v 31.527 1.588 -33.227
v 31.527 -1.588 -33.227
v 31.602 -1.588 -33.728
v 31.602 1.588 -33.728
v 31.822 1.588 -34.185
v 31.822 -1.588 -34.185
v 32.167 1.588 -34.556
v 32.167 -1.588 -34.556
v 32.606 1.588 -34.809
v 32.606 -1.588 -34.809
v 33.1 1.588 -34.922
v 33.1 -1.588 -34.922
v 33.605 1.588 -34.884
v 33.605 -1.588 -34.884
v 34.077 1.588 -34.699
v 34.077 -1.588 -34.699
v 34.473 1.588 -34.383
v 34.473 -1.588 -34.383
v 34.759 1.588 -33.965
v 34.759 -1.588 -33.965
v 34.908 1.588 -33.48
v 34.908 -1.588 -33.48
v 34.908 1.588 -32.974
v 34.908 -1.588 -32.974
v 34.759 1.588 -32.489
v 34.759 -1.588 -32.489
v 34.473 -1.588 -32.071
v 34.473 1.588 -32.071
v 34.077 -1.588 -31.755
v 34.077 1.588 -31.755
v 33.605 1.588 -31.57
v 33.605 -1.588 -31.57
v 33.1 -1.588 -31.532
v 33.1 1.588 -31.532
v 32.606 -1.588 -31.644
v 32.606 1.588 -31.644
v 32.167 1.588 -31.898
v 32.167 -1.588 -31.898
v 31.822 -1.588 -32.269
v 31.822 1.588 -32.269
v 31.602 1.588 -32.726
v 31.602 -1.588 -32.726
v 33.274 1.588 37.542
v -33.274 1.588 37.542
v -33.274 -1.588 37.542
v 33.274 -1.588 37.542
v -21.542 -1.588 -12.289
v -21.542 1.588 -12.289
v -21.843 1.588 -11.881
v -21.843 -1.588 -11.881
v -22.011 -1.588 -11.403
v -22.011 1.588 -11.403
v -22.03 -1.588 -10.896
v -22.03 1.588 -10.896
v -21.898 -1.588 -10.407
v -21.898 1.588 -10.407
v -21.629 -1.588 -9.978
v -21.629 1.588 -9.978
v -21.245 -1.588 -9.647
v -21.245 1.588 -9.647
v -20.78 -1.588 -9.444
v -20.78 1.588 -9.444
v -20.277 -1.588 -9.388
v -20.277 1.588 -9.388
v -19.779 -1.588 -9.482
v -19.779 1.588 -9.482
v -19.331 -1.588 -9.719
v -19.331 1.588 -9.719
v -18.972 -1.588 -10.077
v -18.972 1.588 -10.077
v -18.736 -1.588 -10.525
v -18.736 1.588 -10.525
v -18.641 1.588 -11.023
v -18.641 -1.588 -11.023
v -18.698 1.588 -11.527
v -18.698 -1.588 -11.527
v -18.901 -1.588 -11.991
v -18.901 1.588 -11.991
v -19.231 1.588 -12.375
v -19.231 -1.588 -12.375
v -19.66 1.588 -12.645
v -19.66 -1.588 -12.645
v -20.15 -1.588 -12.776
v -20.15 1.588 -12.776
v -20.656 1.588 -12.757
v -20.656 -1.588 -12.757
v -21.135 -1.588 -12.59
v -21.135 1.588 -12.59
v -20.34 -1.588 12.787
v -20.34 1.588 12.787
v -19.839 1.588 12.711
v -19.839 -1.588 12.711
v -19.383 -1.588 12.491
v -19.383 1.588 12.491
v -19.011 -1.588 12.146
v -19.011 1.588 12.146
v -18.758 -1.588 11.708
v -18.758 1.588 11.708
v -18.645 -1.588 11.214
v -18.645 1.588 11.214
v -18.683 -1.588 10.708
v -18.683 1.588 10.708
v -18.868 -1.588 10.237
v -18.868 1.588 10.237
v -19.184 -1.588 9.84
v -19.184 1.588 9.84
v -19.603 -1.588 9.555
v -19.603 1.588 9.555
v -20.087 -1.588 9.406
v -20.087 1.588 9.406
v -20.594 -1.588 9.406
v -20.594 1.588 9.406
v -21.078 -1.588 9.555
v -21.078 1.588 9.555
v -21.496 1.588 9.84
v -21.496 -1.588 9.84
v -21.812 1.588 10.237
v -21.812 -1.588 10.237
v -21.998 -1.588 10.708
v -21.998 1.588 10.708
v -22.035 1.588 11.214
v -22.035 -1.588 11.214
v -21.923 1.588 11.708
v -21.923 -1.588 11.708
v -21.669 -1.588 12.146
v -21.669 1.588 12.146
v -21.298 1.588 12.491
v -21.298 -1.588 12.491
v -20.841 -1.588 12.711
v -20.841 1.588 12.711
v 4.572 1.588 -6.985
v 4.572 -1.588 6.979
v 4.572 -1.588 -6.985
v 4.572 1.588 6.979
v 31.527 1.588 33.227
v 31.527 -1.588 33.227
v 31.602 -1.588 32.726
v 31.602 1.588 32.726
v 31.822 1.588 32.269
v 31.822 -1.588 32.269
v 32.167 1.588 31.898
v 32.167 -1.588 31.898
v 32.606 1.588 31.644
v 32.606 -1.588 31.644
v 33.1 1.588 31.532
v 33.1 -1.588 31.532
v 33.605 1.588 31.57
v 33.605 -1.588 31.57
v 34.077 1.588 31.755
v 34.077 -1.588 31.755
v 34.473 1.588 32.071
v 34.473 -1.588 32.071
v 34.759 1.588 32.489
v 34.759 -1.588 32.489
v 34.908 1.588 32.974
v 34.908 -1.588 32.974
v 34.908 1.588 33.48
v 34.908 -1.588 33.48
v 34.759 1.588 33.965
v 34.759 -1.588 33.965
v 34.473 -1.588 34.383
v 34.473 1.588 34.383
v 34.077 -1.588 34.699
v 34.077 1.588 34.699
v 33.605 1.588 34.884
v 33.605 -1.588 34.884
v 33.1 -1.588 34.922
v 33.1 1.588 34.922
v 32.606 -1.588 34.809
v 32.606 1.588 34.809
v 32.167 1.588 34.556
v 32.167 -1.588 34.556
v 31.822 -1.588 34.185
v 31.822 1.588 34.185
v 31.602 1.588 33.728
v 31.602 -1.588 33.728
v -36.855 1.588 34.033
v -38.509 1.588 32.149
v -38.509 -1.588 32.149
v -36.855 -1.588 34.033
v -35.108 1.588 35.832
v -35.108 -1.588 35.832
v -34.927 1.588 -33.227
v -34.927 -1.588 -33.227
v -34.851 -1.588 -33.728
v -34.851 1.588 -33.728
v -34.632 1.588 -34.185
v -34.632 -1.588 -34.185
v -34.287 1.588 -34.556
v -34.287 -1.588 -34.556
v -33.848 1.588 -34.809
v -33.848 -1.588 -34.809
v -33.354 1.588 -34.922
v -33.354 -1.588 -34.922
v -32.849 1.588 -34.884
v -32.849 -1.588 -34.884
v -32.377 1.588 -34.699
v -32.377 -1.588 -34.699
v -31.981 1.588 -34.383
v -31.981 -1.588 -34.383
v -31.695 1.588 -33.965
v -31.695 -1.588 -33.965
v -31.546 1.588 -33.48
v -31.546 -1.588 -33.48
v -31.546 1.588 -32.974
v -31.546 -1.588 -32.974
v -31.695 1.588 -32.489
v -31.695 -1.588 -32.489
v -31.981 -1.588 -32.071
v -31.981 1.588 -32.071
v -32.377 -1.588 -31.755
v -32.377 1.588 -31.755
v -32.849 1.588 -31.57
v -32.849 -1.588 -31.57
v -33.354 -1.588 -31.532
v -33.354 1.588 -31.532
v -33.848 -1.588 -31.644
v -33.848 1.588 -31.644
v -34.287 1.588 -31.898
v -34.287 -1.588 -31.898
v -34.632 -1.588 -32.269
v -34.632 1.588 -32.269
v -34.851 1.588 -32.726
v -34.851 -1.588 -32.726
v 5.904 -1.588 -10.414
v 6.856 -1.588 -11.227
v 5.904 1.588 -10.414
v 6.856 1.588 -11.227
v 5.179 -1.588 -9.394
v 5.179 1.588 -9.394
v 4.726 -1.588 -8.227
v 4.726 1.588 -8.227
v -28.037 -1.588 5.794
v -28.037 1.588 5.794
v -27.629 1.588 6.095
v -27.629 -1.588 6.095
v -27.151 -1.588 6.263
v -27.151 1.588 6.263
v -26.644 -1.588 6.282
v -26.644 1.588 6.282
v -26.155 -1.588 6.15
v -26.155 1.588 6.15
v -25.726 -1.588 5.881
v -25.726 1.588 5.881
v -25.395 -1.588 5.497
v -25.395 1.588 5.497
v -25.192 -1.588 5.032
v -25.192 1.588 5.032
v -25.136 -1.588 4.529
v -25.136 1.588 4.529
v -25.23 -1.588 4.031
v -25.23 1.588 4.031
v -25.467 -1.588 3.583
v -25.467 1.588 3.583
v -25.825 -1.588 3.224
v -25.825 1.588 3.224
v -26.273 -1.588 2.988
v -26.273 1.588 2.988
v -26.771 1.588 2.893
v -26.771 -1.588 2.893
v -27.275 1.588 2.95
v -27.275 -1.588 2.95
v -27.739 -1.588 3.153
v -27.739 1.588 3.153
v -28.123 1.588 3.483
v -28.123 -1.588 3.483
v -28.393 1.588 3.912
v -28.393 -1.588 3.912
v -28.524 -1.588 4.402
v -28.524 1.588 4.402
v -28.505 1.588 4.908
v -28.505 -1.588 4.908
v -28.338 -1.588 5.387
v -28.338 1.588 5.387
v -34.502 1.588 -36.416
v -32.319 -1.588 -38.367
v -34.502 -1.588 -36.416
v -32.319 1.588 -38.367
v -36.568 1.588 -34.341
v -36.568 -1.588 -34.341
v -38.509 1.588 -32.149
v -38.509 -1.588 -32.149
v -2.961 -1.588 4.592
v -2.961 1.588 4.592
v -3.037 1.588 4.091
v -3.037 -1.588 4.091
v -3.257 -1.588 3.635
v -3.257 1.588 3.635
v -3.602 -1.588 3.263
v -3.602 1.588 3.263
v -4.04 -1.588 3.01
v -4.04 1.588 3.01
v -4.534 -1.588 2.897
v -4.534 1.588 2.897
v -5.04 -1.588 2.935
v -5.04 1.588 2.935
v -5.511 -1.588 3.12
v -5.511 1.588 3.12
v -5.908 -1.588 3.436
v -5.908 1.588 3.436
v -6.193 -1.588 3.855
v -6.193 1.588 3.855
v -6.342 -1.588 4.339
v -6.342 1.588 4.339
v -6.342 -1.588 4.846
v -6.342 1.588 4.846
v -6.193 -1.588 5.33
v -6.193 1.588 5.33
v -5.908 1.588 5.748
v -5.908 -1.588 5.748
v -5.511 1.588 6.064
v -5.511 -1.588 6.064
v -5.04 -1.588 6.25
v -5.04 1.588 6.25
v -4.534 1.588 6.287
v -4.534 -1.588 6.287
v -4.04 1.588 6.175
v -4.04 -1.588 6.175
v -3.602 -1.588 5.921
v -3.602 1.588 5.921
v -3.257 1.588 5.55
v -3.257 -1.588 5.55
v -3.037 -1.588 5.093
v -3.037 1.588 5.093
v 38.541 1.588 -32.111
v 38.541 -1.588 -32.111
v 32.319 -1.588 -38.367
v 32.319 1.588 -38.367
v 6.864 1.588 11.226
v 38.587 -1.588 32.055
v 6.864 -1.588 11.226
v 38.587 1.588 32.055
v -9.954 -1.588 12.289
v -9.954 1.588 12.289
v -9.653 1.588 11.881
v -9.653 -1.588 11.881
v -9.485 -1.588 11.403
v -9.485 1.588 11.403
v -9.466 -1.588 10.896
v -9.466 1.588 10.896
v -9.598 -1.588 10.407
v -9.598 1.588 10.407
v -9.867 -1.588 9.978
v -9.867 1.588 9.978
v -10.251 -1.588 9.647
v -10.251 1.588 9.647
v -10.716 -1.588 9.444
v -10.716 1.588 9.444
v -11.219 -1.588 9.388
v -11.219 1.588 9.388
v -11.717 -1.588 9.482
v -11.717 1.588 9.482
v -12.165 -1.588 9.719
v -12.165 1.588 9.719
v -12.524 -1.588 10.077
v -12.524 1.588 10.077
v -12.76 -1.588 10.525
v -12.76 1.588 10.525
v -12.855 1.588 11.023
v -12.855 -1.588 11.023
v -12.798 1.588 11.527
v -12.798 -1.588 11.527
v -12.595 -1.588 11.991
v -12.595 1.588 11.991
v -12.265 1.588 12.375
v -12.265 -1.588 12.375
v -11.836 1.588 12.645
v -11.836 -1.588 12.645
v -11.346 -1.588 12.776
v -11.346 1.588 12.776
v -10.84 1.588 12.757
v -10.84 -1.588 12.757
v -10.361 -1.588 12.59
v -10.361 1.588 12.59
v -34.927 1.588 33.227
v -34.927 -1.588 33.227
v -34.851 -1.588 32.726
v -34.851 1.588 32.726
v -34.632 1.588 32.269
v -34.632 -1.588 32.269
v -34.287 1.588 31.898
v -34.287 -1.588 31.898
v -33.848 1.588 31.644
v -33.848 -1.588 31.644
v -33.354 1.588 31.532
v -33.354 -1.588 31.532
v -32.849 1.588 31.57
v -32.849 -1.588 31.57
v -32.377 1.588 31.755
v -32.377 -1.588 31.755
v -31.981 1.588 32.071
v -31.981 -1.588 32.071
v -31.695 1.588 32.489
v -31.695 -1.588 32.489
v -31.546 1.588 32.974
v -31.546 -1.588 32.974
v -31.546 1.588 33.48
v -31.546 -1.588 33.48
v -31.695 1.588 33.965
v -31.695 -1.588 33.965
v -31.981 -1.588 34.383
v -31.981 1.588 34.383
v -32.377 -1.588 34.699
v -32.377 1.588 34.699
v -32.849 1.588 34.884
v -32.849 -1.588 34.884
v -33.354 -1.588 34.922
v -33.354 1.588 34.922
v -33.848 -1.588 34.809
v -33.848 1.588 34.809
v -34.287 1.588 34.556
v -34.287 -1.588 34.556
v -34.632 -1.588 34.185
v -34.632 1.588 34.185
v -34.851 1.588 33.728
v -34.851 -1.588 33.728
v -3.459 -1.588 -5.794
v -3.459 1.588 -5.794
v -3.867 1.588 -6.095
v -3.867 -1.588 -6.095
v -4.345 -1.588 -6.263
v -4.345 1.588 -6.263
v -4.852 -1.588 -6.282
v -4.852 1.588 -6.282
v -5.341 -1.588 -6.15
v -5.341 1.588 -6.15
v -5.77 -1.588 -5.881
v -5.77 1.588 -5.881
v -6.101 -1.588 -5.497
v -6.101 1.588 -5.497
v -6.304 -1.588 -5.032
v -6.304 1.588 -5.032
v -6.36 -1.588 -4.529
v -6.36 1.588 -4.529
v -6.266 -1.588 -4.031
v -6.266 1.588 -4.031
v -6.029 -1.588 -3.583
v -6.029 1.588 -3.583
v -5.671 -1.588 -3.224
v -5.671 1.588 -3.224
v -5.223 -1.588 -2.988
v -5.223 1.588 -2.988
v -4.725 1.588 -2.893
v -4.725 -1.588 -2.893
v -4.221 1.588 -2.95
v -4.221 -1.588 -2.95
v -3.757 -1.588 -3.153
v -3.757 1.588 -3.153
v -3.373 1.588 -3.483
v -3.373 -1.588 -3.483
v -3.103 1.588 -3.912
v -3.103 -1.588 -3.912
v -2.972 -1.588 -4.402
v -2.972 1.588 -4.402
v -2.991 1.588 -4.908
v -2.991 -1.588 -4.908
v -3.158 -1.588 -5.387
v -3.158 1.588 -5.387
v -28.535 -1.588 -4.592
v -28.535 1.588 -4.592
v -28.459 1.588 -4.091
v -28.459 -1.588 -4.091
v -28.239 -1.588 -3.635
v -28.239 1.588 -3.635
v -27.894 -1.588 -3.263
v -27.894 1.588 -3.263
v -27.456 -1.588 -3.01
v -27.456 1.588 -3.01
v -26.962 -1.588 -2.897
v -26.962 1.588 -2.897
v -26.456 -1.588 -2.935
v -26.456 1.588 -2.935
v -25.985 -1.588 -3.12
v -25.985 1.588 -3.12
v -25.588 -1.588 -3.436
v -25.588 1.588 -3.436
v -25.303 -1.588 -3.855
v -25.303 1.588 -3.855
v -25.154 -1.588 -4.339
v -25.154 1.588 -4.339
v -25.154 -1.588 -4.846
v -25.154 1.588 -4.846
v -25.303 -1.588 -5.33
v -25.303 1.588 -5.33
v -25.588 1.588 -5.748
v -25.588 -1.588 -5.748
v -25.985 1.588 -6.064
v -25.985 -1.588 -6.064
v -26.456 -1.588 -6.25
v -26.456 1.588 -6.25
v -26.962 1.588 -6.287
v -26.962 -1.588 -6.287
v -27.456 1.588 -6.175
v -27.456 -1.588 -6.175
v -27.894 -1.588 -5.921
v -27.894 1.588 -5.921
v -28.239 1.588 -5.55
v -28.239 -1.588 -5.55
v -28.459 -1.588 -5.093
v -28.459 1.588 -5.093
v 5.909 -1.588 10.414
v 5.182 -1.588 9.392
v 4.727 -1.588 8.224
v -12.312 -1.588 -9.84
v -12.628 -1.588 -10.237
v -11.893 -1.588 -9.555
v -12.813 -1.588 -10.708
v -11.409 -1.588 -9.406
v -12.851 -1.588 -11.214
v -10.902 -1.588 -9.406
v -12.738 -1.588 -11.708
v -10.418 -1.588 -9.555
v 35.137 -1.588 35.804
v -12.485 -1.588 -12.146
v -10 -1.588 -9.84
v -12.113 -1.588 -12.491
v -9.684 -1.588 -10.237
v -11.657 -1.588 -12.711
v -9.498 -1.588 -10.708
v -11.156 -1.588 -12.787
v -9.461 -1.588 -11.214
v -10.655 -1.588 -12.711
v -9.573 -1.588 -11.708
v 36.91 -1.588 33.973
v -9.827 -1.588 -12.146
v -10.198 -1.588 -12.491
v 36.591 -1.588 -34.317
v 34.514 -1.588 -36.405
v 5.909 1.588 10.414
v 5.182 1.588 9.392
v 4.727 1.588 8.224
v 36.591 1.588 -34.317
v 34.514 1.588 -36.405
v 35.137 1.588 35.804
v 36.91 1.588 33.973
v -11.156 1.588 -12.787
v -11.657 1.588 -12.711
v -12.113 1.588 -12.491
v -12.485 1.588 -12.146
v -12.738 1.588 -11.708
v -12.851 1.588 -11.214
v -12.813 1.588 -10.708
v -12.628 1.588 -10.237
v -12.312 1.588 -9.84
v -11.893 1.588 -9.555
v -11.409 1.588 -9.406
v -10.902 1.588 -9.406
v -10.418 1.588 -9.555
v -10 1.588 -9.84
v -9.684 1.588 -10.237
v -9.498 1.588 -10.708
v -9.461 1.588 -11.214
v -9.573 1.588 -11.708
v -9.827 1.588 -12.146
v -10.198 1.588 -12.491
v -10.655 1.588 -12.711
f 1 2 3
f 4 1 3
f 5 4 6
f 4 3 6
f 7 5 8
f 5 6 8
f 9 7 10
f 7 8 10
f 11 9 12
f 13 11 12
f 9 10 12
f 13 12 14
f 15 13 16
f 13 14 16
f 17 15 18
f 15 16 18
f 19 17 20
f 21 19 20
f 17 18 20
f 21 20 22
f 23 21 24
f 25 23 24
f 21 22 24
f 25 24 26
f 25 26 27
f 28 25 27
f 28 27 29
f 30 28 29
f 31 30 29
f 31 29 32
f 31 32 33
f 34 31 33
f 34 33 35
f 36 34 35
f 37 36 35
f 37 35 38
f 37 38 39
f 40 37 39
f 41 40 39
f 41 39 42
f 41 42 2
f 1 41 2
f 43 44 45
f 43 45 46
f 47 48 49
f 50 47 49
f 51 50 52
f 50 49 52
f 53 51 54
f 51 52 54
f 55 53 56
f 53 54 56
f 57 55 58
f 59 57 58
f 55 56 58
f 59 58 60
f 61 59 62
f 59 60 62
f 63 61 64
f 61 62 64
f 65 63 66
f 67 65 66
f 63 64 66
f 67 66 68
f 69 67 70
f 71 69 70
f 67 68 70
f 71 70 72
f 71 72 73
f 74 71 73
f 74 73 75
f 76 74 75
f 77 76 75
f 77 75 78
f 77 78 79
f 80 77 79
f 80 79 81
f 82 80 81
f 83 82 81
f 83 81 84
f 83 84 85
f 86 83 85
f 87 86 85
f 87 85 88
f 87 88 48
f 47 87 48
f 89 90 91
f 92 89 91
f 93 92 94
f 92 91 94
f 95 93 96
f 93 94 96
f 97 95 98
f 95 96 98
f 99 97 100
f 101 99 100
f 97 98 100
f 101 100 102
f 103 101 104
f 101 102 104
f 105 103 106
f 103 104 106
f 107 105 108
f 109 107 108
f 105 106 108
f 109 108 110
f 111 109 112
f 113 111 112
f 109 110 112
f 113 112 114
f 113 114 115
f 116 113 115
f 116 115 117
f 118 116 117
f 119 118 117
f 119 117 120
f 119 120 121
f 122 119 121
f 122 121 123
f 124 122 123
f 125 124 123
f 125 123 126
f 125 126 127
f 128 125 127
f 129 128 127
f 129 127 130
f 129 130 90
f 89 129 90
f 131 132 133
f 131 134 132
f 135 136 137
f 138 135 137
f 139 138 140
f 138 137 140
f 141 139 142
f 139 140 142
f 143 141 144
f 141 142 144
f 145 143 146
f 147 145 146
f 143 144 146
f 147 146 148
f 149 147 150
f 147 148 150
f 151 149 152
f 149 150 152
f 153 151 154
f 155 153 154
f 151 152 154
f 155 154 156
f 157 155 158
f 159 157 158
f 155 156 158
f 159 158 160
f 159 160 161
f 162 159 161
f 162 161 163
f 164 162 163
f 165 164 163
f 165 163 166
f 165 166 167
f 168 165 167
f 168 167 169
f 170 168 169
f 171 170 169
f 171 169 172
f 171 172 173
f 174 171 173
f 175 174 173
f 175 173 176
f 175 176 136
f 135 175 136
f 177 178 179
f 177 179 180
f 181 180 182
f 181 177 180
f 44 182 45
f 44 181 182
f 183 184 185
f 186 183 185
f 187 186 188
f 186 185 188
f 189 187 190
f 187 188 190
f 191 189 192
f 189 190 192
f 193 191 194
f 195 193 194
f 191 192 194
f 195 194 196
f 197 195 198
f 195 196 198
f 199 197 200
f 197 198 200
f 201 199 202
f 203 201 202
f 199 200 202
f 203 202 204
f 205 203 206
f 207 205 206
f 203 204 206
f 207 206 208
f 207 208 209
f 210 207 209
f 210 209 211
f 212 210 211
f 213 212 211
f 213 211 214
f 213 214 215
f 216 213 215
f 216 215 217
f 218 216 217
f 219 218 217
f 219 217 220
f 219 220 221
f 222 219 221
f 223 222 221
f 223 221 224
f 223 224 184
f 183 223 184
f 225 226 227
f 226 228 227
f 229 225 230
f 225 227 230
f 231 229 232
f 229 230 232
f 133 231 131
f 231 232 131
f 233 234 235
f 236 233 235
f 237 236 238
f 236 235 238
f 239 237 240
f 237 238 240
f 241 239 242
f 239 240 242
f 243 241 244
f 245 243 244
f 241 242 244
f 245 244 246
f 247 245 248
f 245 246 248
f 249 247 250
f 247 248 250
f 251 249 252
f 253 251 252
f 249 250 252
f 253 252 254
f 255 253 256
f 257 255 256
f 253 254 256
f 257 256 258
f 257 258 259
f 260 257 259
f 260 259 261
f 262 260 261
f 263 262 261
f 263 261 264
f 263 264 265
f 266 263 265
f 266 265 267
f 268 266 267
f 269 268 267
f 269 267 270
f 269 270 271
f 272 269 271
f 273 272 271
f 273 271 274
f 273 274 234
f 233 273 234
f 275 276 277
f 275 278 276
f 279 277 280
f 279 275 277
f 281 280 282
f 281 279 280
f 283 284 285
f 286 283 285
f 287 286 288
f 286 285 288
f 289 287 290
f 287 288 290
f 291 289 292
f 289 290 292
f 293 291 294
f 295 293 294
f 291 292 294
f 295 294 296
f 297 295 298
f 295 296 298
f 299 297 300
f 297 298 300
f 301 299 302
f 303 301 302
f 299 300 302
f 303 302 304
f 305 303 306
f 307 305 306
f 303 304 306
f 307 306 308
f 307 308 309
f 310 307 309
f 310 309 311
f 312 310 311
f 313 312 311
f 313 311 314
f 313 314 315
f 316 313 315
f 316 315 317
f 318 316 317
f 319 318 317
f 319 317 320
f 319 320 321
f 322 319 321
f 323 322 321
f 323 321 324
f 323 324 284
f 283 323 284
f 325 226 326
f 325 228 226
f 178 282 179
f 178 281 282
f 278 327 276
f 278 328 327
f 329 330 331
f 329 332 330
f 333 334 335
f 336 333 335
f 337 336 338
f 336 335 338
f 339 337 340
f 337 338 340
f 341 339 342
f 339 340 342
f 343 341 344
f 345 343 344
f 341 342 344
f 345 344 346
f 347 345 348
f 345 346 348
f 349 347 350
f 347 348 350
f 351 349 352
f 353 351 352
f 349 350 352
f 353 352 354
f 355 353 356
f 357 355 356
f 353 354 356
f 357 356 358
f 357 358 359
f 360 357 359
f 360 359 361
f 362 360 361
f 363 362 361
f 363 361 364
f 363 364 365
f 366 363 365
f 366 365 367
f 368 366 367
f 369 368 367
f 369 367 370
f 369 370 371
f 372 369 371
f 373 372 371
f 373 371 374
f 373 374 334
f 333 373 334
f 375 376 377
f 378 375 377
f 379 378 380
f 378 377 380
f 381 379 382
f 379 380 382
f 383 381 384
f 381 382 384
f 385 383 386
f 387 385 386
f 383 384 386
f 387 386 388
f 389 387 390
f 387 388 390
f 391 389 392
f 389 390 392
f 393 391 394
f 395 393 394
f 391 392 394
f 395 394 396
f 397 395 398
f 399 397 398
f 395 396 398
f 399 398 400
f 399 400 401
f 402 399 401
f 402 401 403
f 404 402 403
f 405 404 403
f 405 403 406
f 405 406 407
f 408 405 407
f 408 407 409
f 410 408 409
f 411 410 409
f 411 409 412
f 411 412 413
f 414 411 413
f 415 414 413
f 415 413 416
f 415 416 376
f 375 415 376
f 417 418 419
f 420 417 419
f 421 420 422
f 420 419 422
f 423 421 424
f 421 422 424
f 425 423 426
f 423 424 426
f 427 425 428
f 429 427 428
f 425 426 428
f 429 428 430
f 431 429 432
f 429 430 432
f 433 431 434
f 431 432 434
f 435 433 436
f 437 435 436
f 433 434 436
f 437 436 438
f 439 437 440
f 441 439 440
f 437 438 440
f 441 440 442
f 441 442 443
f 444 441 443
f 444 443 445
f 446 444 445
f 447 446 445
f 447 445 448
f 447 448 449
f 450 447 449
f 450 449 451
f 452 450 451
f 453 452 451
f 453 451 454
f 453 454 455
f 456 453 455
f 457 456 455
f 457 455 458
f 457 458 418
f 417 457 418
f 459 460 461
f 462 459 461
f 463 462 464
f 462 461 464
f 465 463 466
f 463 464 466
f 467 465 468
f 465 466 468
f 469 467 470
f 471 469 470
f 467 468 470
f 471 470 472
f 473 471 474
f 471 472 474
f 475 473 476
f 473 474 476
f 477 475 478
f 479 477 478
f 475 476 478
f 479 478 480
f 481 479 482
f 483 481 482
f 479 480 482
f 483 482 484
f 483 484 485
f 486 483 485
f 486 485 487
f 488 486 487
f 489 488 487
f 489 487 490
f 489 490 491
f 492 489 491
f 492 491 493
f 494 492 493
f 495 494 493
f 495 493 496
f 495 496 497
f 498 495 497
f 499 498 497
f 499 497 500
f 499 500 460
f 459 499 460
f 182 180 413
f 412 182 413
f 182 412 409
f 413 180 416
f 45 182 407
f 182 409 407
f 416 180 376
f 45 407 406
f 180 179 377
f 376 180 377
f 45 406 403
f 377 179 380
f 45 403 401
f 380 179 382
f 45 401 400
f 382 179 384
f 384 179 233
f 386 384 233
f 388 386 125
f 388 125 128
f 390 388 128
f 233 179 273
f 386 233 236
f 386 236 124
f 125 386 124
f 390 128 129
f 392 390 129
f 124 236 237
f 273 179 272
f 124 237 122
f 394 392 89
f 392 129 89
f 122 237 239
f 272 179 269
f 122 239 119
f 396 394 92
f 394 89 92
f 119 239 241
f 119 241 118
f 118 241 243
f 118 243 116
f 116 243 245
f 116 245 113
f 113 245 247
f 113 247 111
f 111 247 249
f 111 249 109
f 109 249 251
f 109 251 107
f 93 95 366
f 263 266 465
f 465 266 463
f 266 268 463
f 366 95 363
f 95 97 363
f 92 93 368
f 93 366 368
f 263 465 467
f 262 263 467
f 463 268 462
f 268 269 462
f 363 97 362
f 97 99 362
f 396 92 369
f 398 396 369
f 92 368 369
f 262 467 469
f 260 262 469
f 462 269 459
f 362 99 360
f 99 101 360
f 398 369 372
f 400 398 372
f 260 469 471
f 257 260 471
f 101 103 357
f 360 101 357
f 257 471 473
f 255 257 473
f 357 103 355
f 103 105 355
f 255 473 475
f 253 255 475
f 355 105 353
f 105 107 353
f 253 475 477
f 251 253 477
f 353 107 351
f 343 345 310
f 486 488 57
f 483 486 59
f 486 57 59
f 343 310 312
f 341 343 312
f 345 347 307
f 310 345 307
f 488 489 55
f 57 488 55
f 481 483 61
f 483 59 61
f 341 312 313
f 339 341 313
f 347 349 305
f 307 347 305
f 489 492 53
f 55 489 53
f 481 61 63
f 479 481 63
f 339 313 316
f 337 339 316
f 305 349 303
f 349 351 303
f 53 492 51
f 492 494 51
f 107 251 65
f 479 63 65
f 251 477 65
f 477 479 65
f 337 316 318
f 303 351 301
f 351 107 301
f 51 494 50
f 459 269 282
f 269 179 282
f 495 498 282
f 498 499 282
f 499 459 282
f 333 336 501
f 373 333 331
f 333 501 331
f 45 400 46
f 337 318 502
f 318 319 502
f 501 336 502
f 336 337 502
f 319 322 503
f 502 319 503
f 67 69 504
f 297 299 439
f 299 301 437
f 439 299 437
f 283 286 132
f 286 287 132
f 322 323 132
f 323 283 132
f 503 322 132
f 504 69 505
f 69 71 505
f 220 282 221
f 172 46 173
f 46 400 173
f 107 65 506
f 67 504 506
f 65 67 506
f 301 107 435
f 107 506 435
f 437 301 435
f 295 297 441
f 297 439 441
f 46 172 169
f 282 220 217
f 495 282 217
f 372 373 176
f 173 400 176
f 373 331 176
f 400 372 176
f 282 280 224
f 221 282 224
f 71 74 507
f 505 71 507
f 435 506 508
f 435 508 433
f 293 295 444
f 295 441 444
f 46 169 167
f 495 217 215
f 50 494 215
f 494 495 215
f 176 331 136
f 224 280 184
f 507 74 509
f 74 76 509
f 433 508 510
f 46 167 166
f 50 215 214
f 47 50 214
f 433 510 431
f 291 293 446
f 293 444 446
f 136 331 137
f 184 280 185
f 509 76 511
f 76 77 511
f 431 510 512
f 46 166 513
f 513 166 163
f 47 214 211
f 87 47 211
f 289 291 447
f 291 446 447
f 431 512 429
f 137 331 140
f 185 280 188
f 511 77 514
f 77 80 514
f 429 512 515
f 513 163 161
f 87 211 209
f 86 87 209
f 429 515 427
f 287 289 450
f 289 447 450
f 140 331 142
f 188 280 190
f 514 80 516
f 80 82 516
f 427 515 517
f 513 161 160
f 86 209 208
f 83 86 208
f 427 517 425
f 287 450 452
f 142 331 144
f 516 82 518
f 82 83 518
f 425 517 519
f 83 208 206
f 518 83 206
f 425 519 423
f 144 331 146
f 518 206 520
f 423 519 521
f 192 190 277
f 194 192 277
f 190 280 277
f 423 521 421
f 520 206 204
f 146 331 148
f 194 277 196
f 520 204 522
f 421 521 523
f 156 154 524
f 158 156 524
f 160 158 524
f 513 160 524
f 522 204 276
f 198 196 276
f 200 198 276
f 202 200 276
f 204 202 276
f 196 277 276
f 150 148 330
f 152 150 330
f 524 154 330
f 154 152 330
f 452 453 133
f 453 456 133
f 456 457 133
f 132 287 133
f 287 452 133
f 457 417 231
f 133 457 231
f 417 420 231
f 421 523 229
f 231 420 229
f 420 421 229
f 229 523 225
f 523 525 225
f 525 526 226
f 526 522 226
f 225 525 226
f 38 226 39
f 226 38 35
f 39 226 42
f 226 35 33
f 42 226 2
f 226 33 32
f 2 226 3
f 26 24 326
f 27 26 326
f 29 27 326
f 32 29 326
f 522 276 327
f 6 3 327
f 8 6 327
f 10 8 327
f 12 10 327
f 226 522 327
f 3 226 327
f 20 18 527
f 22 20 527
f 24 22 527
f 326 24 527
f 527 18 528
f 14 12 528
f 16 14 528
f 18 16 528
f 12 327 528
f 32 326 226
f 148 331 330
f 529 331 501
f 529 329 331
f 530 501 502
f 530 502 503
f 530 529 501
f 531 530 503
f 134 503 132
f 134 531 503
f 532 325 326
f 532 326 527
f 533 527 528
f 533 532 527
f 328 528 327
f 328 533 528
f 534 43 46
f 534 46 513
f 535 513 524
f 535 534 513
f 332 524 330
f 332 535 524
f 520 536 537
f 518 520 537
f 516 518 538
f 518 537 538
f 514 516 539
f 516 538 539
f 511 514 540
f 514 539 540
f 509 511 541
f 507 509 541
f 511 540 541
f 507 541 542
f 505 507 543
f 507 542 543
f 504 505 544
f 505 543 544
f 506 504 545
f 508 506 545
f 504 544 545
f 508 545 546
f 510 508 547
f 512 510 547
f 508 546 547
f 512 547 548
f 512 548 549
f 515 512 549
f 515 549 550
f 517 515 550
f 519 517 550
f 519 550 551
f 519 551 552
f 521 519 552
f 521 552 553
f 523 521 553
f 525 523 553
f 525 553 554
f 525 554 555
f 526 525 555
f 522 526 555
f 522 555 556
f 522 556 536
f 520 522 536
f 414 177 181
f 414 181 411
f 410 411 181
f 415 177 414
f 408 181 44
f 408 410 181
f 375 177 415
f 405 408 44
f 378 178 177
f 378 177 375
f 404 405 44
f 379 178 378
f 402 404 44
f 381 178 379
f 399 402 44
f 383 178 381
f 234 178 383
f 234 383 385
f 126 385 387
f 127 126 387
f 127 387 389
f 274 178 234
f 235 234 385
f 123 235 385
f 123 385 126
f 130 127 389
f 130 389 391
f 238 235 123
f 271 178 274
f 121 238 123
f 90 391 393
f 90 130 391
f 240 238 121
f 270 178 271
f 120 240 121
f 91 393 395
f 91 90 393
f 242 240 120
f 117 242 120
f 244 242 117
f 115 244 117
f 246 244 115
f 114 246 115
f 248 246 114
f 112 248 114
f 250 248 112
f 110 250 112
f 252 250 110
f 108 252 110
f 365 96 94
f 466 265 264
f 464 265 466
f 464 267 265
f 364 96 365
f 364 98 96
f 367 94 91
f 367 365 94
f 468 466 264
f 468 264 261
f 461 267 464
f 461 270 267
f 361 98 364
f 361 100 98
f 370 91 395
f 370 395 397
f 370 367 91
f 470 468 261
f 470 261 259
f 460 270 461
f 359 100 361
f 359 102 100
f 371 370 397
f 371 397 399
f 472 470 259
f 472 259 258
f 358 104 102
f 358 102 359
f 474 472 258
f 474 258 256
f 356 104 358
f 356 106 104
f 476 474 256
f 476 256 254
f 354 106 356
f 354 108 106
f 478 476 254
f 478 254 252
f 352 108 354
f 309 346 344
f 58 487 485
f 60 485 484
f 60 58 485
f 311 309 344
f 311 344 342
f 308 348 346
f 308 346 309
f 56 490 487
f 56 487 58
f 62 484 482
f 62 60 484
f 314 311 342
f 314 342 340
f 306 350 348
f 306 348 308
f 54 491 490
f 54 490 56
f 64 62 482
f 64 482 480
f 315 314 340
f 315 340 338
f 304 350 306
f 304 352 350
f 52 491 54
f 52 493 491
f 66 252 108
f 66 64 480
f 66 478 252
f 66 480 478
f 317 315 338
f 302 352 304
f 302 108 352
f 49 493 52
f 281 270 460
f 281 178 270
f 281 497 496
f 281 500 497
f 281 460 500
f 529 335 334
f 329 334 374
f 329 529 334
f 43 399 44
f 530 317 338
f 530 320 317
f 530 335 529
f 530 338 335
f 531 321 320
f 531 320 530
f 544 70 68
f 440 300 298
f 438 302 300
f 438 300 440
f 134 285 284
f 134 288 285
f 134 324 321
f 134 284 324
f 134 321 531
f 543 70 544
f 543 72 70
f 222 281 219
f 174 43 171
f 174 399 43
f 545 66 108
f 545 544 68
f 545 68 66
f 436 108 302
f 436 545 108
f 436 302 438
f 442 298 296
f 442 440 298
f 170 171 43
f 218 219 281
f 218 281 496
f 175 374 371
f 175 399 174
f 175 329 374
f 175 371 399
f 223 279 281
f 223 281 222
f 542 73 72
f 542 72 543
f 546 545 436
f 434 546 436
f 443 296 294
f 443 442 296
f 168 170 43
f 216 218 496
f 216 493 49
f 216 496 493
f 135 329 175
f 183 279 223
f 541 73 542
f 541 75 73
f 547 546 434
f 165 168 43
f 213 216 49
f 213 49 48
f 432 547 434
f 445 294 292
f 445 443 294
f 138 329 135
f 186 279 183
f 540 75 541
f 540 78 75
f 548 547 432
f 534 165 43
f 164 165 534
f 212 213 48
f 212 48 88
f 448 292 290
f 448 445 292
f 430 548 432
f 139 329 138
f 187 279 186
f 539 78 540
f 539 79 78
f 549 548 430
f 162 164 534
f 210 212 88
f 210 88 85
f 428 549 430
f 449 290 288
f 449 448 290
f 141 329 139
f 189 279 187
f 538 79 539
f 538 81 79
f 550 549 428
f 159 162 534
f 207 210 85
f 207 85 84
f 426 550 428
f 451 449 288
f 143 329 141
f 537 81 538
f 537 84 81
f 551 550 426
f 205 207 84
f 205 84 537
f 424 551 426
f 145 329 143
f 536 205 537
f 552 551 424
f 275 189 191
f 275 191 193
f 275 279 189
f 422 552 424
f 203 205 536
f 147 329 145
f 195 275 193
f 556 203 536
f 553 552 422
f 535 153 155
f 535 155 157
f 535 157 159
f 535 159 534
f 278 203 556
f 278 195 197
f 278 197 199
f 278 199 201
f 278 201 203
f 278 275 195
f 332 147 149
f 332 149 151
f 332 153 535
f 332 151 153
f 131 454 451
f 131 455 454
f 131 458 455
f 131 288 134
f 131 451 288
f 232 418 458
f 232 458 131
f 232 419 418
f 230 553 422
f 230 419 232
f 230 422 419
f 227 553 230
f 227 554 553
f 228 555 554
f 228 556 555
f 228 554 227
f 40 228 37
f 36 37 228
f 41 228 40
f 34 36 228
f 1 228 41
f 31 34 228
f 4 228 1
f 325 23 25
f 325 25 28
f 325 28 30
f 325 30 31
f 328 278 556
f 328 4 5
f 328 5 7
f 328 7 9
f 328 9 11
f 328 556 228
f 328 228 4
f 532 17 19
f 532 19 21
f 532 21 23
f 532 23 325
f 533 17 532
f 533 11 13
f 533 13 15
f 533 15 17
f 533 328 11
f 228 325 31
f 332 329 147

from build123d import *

# Parameters (mm, degrees)
BOSS_EXTRUDE1_DEPTH  = 1.5875
M3_CLEARANCE_HOLE1_D = 3.4
M3_CLEARANCE_HOLE2_D = 3.4
CIRPATTERN1_COUNT    = 8
FILLET1_R            = 5.08


with BuildPart() as part:
    # Sketch1 → Boss-Extrude1 (new, symmetric)
    with BuildSketch(Plane(origin=(0, 0, 0), x_dir=(1, 0, 0), z_dir=(0, 1, 0))):
        with BuildLine():
            Line((-38.50947489, 32.14883464), (-38.50947489, -32.14883464))
            ThreePointArc((-38.50947489, -32.14883464), (-35.992876625, -34.943383598), (-33.274, -37.541552299))
            Line((-33.274, -37.541552299), (33.274, -37.541552299))
            ThreePointArc((33.274, -37.541552299), (36.035191498, -34.899744966), (38.587271968, -32.055415565))
            Line((38.587271968, -32.055415565), (4.572, -9.720985565))
            Line((4.572, -9.720985565), (4.572, 9.720985565))
            Line((4.572, 9.720985565), (38.541369471, 32.110591154))
            ThreePointArc((38.541369471, 32.110591154), (35.567819018, 35.375944868), (32.318597457, 38.367114609))
            Line((32.318597457, 38.367114609), (-32.318597457, 38.367114609))
            ThreePointArc((-32.318597457, 38.367114609), (-35.55025611, 35.393594272), (-38.50947489, 32.14883464))
        make_face()
    extrude(amount=BOSS_EXTRUDE1_DEPTH, both=True)

    # M3 Clearance Hole1 (through all)
    with Locations(Plane(origin=(0, 1.5875, 0), x_dir=(1, 0, 0), z_dir=(0, 1, 0))):
        with Locations((-33.226947648, 33.226947648), (33.226947648, 33.226947648), (33.226947648, -33.226947648), (-33.226947648, -33.226947648)):
            Hole(M3_CLEARANCE_HOLE1_D / 2)

    # M3 Clearance Hole2 (through all)
    with Locations(Plane(origin=(0, -1.5875, 0), x_dir=(-1, 0, 0), z_dir=(0, -1, 0))):
        with Locations((4.66144561, -4.592201188)):
            m3_clearance_hole2 = Hole(M3_CLEARANCE_HOLE2_D / 2)

    # CirPattern1: M3 Clearance Hole2 ×8 about axis
    cirpattern1_axis = Axis((-15.748, 0, 0), (0, -1, 0))
    for i in range(1, CIRPATTERN1_COUNT):
        add(m3_clearance_hole2.rotate(cirpattern1_axis, i * 360 / CIRPATTERN1_COUNT), mode=Mode.SUBTRACT)

    # Fillet1
    fillet1_edges = [part.edges().sort_by_distance(p)[0] for p in [
        (4.572, 0, -9.720985565),
        (4.572, 0, 9.720985565),
    ]]
    fillet(fillet1_edges, radius=FILLET1_R)


solid = part.part
